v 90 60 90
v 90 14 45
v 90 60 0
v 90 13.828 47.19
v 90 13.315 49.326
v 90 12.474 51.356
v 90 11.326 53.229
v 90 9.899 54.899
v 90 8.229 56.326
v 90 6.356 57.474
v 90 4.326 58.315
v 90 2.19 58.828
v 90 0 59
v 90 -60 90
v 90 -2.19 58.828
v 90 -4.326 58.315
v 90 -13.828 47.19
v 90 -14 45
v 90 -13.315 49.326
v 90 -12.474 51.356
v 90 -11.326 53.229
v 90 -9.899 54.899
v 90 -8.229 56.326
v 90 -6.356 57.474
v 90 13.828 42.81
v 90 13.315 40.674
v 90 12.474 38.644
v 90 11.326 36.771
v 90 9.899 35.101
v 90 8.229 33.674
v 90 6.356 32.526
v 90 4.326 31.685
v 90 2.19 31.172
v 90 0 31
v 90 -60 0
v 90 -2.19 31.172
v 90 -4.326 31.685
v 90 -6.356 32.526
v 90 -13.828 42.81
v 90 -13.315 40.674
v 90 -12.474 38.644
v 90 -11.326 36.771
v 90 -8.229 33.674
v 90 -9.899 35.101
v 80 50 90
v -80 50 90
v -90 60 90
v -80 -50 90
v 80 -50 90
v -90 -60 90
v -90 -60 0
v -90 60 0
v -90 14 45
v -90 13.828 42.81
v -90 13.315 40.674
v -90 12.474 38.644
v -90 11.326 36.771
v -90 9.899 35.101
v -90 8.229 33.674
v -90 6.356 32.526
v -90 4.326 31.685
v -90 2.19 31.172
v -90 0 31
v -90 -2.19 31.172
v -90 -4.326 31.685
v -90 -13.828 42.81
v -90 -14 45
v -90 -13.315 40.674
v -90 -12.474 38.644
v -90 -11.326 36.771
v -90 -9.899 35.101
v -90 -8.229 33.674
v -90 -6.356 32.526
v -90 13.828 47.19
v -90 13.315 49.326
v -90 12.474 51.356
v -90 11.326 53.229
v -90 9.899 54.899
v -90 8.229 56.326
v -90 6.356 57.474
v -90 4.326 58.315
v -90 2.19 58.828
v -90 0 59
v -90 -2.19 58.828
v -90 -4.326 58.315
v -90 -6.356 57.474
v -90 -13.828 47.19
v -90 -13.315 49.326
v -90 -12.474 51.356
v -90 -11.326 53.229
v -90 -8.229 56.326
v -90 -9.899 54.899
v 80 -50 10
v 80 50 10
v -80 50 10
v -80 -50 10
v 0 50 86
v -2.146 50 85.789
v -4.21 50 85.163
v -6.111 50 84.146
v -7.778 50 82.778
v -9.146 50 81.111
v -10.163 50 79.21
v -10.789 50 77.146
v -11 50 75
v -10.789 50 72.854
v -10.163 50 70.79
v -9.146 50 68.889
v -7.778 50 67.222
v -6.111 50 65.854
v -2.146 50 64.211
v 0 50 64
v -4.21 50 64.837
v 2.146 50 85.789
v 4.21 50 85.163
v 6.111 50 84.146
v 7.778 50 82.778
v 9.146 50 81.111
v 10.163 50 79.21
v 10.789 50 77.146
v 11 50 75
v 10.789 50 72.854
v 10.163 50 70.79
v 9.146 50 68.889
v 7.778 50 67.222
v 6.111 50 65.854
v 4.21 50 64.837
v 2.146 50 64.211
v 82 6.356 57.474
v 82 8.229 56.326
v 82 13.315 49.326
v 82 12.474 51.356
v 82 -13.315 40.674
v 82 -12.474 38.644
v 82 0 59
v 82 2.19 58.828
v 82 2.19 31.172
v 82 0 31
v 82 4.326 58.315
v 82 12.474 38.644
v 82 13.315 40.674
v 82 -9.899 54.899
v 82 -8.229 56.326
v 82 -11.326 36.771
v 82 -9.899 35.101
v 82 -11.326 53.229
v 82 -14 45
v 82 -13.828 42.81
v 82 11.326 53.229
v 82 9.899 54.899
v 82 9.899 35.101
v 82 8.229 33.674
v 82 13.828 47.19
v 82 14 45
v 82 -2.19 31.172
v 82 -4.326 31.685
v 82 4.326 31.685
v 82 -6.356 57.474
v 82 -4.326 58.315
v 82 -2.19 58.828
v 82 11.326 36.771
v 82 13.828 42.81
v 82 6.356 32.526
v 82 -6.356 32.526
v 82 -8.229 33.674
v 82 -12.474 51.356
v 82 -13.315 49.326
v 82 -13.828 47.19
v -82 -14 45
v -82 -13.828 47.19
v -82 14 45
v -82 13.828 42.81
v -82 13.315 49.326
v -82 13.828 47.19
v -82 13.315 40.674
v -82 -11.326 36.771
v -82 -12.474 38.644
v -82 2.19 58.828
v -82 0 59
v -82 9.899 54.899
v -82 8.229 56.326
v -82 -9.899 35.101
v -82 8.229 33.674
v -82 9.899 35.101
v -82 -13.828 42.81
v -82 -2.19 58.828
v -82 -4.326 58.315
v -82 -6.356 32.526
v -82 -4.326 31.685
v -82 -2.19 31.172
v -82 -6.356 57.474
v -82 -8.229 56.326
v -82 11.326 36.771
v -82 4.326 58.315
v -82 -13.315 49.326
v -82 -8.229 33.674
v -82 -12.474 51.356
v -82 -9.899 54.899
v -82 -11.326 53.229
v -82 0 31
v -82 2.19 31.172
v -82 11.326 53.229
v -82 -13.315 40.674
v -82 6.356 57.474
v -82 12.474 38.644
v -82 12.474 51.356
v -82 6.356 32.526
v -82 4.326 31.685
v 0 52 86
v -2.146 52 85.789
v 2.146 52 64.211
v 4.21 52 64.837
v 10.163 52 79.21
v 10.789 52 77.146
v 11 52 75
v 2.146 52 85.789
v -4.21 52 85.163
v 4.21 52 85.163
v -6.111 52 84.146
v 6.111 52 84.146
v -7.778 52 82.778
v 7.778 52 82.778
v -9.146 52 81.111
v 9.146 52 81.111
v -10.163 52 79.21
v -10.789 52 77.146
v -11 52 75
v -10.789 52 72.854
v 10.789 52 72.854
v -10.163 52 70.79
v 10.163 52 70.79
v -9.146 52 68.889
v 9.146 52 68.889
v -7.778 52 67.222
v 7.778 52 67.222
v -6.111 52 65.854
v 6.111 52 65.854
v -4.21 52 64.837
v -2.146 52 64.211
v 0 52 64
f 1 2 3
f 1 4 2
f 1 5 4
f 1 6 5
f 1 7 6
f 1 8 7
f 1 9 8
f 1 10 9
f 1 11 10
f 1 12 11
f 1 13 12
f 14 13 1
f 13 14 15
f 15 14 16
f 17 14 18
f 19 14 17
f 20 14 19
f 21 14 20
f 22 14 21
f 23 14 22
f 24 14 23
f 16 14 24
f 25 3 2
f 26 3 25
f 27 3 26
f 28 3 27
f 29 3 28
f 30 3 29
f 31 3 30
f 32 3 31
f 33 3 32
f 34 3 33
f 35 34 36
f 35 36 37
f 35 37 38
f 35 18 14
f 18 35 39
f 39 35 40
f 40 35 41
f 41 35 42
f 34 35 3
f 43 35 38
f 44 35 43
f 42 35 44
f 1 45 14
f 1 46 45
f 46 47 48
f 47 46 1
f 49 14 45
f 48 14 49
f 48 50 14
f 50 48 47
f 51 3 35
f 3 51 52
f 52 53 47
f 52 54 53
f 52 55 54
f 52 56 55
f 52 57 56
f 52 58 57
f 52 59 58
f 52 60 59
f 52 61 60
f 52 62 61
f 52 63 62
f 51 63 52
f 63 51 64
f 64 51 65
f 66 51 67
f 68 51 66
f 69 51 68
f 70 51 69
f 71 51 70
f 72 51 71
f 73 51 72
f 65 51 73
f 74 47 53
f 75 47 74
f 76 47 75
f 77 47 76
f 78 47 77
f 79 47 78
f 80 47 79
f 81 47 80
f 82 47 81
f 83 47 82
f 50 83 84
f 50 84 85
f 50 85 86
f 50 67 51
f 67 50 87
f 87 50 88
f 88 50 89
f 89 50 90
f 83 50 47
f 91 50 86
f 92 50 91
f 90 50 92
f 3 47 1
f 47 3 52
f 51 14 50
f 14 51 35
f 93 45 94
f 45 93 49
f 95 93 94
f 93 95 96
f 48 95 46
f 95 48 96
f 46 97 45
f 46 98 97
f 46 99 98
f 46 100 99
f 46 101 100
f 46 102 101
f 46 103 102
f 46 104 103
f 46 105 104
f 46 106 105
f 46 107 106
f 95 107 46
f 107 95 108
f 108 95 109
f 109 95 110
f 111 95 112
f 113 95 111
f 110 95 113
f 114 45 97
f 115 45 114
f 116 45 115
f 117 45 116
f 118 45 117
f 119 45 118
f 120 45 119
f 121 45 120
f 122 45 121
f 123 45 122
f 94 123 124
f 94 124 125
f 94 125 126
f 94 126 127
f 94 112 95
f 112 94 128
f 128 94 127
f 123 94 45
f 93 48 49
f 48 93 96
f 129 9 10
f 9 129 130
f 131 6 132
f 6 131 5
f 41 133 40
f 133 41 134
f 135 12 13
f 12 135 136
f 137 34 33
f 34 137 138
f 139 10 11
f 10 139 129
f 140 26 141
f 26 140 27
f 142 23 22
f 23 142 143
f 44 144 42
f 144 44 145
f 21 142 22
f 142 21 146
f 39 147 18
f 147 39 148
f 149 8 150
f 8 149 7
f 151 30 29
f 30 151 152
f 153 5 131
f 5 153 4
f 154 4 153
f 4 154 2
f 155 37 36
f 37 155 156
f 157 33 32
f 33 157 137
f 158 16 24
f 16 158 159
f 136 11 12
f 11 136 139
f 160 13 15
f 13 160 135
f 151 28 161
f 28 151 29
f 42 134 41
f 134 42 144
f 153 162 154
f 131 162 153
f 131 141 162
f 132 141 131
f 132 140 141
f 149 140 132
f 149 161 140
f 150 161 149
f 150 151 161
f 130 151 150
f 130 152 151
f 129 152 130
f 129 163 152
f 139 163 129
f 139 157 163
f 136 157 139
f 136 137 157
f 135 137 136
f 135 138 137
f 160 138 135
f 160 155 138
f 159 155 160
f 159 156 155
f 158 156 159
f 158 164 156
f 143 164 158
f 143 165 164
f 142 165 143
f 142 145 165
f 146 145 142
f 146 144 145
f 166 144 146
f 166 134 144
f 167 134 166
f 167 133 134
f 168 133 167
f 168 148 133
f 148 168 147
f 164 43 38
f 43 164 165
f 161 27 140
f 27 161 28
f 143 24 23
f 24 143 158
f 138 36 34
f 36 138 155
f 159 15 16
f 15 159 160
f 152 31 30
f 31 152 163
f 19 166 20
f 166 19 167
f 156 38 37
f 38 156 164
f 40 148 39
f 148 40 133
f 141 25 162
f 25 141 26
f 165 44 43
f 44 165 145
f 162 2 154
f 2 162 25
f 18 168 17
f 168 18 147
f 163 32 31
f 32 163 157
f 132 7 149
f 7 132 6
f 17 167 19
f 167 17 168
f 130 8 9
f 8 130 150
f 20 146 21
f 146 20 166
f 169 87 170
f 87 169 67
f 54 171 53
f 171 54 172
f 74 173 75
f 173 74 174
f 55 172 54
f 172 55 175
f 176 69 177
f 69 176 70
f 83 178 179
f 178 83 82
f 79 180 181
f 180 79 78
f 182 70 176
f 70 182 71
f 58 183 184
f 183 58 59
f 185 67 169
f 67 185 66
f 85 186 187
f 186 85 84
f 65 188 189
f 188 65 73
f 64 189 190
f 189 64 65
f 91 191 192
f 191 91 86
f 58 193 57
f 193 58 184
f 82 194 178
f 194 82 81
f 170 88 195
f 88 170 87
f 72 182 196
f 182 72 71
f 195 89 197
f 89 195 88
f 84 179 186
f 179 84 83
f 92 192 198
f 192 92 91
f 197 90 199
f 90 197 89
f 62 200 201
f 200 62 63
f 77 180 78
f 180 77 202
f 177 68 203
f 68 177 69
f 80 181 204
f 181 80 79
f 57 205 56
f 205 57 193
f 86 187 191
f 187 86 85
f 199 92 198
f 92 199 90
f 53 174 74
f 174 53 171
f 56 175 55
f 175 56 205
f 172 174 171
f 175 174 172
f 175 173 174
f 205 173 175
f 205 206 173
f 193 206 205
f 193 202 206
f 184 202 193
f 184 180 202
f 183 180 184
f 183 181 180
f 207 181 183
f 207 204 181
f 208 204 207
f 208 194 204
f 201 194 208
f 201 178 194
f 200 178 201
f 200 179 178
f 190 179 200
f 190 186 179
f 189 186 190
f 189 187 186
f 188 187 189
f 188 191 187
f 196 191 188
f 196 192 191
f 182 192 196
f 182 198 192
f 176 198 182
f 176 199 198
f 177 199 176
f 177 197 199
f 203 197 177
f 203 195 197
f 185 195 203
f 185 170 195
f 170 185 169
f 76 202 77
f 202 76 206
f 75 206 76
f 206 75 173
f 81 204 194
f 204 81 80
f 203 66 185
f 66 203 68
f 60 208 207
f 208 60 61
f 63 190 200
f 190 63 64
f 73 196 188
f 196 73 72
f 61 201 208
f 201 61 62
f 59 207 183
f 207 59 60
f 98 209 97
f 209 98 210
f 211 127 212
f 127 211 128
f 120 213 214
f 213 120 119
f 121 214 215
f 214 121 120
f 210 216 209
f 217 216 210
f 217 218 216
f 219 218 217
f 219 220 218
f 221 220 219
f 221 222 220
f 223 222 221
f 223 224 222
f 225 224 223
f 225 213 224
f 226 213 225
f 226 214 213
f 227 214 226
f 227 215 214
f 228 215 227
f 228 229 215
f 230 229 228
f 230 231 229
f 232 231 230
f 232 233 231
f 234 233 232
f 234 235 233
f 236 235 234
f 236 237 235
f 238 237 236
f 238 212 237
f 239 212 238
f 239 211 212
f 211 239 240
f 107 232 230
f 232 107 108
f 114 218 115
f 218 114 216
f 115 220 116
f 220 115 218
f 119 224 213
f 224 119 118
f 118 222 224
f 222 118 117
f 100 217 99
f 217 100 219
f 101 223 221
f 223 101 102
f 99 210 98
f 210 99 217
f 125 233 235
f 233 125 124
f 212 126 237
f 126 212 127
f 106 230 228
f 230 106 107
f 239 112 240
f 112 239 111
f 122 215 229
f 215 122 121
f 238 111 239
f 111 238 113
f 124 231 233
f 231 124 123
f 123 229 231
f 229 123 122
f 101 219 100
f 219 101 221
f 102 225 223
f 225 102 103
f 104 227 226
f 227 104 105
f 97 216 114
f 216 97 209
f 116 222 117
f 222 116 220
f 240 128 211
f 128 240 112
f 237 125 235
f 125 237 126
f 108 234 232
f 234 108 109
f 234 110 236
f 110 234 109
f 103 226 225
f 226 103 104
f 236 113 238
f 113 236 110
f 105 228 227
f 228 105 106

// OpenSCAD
// file: lib/utils.scad
// Shared utilities for CHORUS-SGH-1 OpenSCAD

module flanged_port(od=16, length=25, flange_od=40, flange_t=6) {
    translate([0, 0, -length])
        cylinder(h=length, d=od, $fn=32);
    cylinder(h=flange_t, d=flange_od, $fn=48);
}

module o_ring_groove(dia, depth=2.2, width=3.0) {
    rotate_extrude($fn=64)
        translate([dia/2 - depth, 0])
            square([depth, width], center=true);
}

module bolt_hole(d=6.6, h=50) {
    cylinder(h=h, d=d, $fn=24);
}

module bolt_circle_pattern(n, radius, d=6.6, h=50) {
    for (i = [0:n-1]) {
        ang = 360 * i / n;
        rotate([0, 0, ang])
            translate([radius, 0, 0])
                bolt_hole(d=d, h=h);
    }
}

module plate_frame(w, h, t, corner_r=8) {
    linear_extrude(t)
        offset(r=corner_r)
            square([w - 2*corner_r, h - 2*corner_r], center=true);
}
// file: lib/generated_constants.scad
// AUTO-GENERATED from simulation/sizing.py — do not hand edit
P_target_W = 10.0;
A_mem_m2 = 0.72;
active_w = 200.0;
active_h = 300.0;
n_plates = 12;
housing_od = 280.0;
housing_len = 264;
bolt_circle = 240.0;
frame_L = 664;
frame_W = 480.0;
frame_H = 900;
delta_P_bar = 34.58;
plate_pitch = 12;
// main file
// Pressure exchanger / work recovery module (simplified body)
include <lib/generated_constants.scad>
include <lib/utils.scad>

module px_module() {
  L = 180; W = 120; H = 90;
  difference() {
    translate([-L/2, -W/2, 0]) cube([L, W, H]);
    translate([-L/2+10, -W/2+10, 10]) cube([L-20, W-20, H]);
    // HP draw in
    translate([L/2-8, 0, H/2]) rotate([0,90,0]) cylinder(h=25, d=28, $fn=40);
    // LP out
    translate([-L/2+8, 0, H/2]) rotate([0,-90,0]) cylinder(h=25, d=28, $fn=40);
    // brine low pressure return
    translate([0, W/2-8, H-15]) rotate([90,0,0]) cylinder(h=20, d=22, $fn=32);
  }
}
px_module();
